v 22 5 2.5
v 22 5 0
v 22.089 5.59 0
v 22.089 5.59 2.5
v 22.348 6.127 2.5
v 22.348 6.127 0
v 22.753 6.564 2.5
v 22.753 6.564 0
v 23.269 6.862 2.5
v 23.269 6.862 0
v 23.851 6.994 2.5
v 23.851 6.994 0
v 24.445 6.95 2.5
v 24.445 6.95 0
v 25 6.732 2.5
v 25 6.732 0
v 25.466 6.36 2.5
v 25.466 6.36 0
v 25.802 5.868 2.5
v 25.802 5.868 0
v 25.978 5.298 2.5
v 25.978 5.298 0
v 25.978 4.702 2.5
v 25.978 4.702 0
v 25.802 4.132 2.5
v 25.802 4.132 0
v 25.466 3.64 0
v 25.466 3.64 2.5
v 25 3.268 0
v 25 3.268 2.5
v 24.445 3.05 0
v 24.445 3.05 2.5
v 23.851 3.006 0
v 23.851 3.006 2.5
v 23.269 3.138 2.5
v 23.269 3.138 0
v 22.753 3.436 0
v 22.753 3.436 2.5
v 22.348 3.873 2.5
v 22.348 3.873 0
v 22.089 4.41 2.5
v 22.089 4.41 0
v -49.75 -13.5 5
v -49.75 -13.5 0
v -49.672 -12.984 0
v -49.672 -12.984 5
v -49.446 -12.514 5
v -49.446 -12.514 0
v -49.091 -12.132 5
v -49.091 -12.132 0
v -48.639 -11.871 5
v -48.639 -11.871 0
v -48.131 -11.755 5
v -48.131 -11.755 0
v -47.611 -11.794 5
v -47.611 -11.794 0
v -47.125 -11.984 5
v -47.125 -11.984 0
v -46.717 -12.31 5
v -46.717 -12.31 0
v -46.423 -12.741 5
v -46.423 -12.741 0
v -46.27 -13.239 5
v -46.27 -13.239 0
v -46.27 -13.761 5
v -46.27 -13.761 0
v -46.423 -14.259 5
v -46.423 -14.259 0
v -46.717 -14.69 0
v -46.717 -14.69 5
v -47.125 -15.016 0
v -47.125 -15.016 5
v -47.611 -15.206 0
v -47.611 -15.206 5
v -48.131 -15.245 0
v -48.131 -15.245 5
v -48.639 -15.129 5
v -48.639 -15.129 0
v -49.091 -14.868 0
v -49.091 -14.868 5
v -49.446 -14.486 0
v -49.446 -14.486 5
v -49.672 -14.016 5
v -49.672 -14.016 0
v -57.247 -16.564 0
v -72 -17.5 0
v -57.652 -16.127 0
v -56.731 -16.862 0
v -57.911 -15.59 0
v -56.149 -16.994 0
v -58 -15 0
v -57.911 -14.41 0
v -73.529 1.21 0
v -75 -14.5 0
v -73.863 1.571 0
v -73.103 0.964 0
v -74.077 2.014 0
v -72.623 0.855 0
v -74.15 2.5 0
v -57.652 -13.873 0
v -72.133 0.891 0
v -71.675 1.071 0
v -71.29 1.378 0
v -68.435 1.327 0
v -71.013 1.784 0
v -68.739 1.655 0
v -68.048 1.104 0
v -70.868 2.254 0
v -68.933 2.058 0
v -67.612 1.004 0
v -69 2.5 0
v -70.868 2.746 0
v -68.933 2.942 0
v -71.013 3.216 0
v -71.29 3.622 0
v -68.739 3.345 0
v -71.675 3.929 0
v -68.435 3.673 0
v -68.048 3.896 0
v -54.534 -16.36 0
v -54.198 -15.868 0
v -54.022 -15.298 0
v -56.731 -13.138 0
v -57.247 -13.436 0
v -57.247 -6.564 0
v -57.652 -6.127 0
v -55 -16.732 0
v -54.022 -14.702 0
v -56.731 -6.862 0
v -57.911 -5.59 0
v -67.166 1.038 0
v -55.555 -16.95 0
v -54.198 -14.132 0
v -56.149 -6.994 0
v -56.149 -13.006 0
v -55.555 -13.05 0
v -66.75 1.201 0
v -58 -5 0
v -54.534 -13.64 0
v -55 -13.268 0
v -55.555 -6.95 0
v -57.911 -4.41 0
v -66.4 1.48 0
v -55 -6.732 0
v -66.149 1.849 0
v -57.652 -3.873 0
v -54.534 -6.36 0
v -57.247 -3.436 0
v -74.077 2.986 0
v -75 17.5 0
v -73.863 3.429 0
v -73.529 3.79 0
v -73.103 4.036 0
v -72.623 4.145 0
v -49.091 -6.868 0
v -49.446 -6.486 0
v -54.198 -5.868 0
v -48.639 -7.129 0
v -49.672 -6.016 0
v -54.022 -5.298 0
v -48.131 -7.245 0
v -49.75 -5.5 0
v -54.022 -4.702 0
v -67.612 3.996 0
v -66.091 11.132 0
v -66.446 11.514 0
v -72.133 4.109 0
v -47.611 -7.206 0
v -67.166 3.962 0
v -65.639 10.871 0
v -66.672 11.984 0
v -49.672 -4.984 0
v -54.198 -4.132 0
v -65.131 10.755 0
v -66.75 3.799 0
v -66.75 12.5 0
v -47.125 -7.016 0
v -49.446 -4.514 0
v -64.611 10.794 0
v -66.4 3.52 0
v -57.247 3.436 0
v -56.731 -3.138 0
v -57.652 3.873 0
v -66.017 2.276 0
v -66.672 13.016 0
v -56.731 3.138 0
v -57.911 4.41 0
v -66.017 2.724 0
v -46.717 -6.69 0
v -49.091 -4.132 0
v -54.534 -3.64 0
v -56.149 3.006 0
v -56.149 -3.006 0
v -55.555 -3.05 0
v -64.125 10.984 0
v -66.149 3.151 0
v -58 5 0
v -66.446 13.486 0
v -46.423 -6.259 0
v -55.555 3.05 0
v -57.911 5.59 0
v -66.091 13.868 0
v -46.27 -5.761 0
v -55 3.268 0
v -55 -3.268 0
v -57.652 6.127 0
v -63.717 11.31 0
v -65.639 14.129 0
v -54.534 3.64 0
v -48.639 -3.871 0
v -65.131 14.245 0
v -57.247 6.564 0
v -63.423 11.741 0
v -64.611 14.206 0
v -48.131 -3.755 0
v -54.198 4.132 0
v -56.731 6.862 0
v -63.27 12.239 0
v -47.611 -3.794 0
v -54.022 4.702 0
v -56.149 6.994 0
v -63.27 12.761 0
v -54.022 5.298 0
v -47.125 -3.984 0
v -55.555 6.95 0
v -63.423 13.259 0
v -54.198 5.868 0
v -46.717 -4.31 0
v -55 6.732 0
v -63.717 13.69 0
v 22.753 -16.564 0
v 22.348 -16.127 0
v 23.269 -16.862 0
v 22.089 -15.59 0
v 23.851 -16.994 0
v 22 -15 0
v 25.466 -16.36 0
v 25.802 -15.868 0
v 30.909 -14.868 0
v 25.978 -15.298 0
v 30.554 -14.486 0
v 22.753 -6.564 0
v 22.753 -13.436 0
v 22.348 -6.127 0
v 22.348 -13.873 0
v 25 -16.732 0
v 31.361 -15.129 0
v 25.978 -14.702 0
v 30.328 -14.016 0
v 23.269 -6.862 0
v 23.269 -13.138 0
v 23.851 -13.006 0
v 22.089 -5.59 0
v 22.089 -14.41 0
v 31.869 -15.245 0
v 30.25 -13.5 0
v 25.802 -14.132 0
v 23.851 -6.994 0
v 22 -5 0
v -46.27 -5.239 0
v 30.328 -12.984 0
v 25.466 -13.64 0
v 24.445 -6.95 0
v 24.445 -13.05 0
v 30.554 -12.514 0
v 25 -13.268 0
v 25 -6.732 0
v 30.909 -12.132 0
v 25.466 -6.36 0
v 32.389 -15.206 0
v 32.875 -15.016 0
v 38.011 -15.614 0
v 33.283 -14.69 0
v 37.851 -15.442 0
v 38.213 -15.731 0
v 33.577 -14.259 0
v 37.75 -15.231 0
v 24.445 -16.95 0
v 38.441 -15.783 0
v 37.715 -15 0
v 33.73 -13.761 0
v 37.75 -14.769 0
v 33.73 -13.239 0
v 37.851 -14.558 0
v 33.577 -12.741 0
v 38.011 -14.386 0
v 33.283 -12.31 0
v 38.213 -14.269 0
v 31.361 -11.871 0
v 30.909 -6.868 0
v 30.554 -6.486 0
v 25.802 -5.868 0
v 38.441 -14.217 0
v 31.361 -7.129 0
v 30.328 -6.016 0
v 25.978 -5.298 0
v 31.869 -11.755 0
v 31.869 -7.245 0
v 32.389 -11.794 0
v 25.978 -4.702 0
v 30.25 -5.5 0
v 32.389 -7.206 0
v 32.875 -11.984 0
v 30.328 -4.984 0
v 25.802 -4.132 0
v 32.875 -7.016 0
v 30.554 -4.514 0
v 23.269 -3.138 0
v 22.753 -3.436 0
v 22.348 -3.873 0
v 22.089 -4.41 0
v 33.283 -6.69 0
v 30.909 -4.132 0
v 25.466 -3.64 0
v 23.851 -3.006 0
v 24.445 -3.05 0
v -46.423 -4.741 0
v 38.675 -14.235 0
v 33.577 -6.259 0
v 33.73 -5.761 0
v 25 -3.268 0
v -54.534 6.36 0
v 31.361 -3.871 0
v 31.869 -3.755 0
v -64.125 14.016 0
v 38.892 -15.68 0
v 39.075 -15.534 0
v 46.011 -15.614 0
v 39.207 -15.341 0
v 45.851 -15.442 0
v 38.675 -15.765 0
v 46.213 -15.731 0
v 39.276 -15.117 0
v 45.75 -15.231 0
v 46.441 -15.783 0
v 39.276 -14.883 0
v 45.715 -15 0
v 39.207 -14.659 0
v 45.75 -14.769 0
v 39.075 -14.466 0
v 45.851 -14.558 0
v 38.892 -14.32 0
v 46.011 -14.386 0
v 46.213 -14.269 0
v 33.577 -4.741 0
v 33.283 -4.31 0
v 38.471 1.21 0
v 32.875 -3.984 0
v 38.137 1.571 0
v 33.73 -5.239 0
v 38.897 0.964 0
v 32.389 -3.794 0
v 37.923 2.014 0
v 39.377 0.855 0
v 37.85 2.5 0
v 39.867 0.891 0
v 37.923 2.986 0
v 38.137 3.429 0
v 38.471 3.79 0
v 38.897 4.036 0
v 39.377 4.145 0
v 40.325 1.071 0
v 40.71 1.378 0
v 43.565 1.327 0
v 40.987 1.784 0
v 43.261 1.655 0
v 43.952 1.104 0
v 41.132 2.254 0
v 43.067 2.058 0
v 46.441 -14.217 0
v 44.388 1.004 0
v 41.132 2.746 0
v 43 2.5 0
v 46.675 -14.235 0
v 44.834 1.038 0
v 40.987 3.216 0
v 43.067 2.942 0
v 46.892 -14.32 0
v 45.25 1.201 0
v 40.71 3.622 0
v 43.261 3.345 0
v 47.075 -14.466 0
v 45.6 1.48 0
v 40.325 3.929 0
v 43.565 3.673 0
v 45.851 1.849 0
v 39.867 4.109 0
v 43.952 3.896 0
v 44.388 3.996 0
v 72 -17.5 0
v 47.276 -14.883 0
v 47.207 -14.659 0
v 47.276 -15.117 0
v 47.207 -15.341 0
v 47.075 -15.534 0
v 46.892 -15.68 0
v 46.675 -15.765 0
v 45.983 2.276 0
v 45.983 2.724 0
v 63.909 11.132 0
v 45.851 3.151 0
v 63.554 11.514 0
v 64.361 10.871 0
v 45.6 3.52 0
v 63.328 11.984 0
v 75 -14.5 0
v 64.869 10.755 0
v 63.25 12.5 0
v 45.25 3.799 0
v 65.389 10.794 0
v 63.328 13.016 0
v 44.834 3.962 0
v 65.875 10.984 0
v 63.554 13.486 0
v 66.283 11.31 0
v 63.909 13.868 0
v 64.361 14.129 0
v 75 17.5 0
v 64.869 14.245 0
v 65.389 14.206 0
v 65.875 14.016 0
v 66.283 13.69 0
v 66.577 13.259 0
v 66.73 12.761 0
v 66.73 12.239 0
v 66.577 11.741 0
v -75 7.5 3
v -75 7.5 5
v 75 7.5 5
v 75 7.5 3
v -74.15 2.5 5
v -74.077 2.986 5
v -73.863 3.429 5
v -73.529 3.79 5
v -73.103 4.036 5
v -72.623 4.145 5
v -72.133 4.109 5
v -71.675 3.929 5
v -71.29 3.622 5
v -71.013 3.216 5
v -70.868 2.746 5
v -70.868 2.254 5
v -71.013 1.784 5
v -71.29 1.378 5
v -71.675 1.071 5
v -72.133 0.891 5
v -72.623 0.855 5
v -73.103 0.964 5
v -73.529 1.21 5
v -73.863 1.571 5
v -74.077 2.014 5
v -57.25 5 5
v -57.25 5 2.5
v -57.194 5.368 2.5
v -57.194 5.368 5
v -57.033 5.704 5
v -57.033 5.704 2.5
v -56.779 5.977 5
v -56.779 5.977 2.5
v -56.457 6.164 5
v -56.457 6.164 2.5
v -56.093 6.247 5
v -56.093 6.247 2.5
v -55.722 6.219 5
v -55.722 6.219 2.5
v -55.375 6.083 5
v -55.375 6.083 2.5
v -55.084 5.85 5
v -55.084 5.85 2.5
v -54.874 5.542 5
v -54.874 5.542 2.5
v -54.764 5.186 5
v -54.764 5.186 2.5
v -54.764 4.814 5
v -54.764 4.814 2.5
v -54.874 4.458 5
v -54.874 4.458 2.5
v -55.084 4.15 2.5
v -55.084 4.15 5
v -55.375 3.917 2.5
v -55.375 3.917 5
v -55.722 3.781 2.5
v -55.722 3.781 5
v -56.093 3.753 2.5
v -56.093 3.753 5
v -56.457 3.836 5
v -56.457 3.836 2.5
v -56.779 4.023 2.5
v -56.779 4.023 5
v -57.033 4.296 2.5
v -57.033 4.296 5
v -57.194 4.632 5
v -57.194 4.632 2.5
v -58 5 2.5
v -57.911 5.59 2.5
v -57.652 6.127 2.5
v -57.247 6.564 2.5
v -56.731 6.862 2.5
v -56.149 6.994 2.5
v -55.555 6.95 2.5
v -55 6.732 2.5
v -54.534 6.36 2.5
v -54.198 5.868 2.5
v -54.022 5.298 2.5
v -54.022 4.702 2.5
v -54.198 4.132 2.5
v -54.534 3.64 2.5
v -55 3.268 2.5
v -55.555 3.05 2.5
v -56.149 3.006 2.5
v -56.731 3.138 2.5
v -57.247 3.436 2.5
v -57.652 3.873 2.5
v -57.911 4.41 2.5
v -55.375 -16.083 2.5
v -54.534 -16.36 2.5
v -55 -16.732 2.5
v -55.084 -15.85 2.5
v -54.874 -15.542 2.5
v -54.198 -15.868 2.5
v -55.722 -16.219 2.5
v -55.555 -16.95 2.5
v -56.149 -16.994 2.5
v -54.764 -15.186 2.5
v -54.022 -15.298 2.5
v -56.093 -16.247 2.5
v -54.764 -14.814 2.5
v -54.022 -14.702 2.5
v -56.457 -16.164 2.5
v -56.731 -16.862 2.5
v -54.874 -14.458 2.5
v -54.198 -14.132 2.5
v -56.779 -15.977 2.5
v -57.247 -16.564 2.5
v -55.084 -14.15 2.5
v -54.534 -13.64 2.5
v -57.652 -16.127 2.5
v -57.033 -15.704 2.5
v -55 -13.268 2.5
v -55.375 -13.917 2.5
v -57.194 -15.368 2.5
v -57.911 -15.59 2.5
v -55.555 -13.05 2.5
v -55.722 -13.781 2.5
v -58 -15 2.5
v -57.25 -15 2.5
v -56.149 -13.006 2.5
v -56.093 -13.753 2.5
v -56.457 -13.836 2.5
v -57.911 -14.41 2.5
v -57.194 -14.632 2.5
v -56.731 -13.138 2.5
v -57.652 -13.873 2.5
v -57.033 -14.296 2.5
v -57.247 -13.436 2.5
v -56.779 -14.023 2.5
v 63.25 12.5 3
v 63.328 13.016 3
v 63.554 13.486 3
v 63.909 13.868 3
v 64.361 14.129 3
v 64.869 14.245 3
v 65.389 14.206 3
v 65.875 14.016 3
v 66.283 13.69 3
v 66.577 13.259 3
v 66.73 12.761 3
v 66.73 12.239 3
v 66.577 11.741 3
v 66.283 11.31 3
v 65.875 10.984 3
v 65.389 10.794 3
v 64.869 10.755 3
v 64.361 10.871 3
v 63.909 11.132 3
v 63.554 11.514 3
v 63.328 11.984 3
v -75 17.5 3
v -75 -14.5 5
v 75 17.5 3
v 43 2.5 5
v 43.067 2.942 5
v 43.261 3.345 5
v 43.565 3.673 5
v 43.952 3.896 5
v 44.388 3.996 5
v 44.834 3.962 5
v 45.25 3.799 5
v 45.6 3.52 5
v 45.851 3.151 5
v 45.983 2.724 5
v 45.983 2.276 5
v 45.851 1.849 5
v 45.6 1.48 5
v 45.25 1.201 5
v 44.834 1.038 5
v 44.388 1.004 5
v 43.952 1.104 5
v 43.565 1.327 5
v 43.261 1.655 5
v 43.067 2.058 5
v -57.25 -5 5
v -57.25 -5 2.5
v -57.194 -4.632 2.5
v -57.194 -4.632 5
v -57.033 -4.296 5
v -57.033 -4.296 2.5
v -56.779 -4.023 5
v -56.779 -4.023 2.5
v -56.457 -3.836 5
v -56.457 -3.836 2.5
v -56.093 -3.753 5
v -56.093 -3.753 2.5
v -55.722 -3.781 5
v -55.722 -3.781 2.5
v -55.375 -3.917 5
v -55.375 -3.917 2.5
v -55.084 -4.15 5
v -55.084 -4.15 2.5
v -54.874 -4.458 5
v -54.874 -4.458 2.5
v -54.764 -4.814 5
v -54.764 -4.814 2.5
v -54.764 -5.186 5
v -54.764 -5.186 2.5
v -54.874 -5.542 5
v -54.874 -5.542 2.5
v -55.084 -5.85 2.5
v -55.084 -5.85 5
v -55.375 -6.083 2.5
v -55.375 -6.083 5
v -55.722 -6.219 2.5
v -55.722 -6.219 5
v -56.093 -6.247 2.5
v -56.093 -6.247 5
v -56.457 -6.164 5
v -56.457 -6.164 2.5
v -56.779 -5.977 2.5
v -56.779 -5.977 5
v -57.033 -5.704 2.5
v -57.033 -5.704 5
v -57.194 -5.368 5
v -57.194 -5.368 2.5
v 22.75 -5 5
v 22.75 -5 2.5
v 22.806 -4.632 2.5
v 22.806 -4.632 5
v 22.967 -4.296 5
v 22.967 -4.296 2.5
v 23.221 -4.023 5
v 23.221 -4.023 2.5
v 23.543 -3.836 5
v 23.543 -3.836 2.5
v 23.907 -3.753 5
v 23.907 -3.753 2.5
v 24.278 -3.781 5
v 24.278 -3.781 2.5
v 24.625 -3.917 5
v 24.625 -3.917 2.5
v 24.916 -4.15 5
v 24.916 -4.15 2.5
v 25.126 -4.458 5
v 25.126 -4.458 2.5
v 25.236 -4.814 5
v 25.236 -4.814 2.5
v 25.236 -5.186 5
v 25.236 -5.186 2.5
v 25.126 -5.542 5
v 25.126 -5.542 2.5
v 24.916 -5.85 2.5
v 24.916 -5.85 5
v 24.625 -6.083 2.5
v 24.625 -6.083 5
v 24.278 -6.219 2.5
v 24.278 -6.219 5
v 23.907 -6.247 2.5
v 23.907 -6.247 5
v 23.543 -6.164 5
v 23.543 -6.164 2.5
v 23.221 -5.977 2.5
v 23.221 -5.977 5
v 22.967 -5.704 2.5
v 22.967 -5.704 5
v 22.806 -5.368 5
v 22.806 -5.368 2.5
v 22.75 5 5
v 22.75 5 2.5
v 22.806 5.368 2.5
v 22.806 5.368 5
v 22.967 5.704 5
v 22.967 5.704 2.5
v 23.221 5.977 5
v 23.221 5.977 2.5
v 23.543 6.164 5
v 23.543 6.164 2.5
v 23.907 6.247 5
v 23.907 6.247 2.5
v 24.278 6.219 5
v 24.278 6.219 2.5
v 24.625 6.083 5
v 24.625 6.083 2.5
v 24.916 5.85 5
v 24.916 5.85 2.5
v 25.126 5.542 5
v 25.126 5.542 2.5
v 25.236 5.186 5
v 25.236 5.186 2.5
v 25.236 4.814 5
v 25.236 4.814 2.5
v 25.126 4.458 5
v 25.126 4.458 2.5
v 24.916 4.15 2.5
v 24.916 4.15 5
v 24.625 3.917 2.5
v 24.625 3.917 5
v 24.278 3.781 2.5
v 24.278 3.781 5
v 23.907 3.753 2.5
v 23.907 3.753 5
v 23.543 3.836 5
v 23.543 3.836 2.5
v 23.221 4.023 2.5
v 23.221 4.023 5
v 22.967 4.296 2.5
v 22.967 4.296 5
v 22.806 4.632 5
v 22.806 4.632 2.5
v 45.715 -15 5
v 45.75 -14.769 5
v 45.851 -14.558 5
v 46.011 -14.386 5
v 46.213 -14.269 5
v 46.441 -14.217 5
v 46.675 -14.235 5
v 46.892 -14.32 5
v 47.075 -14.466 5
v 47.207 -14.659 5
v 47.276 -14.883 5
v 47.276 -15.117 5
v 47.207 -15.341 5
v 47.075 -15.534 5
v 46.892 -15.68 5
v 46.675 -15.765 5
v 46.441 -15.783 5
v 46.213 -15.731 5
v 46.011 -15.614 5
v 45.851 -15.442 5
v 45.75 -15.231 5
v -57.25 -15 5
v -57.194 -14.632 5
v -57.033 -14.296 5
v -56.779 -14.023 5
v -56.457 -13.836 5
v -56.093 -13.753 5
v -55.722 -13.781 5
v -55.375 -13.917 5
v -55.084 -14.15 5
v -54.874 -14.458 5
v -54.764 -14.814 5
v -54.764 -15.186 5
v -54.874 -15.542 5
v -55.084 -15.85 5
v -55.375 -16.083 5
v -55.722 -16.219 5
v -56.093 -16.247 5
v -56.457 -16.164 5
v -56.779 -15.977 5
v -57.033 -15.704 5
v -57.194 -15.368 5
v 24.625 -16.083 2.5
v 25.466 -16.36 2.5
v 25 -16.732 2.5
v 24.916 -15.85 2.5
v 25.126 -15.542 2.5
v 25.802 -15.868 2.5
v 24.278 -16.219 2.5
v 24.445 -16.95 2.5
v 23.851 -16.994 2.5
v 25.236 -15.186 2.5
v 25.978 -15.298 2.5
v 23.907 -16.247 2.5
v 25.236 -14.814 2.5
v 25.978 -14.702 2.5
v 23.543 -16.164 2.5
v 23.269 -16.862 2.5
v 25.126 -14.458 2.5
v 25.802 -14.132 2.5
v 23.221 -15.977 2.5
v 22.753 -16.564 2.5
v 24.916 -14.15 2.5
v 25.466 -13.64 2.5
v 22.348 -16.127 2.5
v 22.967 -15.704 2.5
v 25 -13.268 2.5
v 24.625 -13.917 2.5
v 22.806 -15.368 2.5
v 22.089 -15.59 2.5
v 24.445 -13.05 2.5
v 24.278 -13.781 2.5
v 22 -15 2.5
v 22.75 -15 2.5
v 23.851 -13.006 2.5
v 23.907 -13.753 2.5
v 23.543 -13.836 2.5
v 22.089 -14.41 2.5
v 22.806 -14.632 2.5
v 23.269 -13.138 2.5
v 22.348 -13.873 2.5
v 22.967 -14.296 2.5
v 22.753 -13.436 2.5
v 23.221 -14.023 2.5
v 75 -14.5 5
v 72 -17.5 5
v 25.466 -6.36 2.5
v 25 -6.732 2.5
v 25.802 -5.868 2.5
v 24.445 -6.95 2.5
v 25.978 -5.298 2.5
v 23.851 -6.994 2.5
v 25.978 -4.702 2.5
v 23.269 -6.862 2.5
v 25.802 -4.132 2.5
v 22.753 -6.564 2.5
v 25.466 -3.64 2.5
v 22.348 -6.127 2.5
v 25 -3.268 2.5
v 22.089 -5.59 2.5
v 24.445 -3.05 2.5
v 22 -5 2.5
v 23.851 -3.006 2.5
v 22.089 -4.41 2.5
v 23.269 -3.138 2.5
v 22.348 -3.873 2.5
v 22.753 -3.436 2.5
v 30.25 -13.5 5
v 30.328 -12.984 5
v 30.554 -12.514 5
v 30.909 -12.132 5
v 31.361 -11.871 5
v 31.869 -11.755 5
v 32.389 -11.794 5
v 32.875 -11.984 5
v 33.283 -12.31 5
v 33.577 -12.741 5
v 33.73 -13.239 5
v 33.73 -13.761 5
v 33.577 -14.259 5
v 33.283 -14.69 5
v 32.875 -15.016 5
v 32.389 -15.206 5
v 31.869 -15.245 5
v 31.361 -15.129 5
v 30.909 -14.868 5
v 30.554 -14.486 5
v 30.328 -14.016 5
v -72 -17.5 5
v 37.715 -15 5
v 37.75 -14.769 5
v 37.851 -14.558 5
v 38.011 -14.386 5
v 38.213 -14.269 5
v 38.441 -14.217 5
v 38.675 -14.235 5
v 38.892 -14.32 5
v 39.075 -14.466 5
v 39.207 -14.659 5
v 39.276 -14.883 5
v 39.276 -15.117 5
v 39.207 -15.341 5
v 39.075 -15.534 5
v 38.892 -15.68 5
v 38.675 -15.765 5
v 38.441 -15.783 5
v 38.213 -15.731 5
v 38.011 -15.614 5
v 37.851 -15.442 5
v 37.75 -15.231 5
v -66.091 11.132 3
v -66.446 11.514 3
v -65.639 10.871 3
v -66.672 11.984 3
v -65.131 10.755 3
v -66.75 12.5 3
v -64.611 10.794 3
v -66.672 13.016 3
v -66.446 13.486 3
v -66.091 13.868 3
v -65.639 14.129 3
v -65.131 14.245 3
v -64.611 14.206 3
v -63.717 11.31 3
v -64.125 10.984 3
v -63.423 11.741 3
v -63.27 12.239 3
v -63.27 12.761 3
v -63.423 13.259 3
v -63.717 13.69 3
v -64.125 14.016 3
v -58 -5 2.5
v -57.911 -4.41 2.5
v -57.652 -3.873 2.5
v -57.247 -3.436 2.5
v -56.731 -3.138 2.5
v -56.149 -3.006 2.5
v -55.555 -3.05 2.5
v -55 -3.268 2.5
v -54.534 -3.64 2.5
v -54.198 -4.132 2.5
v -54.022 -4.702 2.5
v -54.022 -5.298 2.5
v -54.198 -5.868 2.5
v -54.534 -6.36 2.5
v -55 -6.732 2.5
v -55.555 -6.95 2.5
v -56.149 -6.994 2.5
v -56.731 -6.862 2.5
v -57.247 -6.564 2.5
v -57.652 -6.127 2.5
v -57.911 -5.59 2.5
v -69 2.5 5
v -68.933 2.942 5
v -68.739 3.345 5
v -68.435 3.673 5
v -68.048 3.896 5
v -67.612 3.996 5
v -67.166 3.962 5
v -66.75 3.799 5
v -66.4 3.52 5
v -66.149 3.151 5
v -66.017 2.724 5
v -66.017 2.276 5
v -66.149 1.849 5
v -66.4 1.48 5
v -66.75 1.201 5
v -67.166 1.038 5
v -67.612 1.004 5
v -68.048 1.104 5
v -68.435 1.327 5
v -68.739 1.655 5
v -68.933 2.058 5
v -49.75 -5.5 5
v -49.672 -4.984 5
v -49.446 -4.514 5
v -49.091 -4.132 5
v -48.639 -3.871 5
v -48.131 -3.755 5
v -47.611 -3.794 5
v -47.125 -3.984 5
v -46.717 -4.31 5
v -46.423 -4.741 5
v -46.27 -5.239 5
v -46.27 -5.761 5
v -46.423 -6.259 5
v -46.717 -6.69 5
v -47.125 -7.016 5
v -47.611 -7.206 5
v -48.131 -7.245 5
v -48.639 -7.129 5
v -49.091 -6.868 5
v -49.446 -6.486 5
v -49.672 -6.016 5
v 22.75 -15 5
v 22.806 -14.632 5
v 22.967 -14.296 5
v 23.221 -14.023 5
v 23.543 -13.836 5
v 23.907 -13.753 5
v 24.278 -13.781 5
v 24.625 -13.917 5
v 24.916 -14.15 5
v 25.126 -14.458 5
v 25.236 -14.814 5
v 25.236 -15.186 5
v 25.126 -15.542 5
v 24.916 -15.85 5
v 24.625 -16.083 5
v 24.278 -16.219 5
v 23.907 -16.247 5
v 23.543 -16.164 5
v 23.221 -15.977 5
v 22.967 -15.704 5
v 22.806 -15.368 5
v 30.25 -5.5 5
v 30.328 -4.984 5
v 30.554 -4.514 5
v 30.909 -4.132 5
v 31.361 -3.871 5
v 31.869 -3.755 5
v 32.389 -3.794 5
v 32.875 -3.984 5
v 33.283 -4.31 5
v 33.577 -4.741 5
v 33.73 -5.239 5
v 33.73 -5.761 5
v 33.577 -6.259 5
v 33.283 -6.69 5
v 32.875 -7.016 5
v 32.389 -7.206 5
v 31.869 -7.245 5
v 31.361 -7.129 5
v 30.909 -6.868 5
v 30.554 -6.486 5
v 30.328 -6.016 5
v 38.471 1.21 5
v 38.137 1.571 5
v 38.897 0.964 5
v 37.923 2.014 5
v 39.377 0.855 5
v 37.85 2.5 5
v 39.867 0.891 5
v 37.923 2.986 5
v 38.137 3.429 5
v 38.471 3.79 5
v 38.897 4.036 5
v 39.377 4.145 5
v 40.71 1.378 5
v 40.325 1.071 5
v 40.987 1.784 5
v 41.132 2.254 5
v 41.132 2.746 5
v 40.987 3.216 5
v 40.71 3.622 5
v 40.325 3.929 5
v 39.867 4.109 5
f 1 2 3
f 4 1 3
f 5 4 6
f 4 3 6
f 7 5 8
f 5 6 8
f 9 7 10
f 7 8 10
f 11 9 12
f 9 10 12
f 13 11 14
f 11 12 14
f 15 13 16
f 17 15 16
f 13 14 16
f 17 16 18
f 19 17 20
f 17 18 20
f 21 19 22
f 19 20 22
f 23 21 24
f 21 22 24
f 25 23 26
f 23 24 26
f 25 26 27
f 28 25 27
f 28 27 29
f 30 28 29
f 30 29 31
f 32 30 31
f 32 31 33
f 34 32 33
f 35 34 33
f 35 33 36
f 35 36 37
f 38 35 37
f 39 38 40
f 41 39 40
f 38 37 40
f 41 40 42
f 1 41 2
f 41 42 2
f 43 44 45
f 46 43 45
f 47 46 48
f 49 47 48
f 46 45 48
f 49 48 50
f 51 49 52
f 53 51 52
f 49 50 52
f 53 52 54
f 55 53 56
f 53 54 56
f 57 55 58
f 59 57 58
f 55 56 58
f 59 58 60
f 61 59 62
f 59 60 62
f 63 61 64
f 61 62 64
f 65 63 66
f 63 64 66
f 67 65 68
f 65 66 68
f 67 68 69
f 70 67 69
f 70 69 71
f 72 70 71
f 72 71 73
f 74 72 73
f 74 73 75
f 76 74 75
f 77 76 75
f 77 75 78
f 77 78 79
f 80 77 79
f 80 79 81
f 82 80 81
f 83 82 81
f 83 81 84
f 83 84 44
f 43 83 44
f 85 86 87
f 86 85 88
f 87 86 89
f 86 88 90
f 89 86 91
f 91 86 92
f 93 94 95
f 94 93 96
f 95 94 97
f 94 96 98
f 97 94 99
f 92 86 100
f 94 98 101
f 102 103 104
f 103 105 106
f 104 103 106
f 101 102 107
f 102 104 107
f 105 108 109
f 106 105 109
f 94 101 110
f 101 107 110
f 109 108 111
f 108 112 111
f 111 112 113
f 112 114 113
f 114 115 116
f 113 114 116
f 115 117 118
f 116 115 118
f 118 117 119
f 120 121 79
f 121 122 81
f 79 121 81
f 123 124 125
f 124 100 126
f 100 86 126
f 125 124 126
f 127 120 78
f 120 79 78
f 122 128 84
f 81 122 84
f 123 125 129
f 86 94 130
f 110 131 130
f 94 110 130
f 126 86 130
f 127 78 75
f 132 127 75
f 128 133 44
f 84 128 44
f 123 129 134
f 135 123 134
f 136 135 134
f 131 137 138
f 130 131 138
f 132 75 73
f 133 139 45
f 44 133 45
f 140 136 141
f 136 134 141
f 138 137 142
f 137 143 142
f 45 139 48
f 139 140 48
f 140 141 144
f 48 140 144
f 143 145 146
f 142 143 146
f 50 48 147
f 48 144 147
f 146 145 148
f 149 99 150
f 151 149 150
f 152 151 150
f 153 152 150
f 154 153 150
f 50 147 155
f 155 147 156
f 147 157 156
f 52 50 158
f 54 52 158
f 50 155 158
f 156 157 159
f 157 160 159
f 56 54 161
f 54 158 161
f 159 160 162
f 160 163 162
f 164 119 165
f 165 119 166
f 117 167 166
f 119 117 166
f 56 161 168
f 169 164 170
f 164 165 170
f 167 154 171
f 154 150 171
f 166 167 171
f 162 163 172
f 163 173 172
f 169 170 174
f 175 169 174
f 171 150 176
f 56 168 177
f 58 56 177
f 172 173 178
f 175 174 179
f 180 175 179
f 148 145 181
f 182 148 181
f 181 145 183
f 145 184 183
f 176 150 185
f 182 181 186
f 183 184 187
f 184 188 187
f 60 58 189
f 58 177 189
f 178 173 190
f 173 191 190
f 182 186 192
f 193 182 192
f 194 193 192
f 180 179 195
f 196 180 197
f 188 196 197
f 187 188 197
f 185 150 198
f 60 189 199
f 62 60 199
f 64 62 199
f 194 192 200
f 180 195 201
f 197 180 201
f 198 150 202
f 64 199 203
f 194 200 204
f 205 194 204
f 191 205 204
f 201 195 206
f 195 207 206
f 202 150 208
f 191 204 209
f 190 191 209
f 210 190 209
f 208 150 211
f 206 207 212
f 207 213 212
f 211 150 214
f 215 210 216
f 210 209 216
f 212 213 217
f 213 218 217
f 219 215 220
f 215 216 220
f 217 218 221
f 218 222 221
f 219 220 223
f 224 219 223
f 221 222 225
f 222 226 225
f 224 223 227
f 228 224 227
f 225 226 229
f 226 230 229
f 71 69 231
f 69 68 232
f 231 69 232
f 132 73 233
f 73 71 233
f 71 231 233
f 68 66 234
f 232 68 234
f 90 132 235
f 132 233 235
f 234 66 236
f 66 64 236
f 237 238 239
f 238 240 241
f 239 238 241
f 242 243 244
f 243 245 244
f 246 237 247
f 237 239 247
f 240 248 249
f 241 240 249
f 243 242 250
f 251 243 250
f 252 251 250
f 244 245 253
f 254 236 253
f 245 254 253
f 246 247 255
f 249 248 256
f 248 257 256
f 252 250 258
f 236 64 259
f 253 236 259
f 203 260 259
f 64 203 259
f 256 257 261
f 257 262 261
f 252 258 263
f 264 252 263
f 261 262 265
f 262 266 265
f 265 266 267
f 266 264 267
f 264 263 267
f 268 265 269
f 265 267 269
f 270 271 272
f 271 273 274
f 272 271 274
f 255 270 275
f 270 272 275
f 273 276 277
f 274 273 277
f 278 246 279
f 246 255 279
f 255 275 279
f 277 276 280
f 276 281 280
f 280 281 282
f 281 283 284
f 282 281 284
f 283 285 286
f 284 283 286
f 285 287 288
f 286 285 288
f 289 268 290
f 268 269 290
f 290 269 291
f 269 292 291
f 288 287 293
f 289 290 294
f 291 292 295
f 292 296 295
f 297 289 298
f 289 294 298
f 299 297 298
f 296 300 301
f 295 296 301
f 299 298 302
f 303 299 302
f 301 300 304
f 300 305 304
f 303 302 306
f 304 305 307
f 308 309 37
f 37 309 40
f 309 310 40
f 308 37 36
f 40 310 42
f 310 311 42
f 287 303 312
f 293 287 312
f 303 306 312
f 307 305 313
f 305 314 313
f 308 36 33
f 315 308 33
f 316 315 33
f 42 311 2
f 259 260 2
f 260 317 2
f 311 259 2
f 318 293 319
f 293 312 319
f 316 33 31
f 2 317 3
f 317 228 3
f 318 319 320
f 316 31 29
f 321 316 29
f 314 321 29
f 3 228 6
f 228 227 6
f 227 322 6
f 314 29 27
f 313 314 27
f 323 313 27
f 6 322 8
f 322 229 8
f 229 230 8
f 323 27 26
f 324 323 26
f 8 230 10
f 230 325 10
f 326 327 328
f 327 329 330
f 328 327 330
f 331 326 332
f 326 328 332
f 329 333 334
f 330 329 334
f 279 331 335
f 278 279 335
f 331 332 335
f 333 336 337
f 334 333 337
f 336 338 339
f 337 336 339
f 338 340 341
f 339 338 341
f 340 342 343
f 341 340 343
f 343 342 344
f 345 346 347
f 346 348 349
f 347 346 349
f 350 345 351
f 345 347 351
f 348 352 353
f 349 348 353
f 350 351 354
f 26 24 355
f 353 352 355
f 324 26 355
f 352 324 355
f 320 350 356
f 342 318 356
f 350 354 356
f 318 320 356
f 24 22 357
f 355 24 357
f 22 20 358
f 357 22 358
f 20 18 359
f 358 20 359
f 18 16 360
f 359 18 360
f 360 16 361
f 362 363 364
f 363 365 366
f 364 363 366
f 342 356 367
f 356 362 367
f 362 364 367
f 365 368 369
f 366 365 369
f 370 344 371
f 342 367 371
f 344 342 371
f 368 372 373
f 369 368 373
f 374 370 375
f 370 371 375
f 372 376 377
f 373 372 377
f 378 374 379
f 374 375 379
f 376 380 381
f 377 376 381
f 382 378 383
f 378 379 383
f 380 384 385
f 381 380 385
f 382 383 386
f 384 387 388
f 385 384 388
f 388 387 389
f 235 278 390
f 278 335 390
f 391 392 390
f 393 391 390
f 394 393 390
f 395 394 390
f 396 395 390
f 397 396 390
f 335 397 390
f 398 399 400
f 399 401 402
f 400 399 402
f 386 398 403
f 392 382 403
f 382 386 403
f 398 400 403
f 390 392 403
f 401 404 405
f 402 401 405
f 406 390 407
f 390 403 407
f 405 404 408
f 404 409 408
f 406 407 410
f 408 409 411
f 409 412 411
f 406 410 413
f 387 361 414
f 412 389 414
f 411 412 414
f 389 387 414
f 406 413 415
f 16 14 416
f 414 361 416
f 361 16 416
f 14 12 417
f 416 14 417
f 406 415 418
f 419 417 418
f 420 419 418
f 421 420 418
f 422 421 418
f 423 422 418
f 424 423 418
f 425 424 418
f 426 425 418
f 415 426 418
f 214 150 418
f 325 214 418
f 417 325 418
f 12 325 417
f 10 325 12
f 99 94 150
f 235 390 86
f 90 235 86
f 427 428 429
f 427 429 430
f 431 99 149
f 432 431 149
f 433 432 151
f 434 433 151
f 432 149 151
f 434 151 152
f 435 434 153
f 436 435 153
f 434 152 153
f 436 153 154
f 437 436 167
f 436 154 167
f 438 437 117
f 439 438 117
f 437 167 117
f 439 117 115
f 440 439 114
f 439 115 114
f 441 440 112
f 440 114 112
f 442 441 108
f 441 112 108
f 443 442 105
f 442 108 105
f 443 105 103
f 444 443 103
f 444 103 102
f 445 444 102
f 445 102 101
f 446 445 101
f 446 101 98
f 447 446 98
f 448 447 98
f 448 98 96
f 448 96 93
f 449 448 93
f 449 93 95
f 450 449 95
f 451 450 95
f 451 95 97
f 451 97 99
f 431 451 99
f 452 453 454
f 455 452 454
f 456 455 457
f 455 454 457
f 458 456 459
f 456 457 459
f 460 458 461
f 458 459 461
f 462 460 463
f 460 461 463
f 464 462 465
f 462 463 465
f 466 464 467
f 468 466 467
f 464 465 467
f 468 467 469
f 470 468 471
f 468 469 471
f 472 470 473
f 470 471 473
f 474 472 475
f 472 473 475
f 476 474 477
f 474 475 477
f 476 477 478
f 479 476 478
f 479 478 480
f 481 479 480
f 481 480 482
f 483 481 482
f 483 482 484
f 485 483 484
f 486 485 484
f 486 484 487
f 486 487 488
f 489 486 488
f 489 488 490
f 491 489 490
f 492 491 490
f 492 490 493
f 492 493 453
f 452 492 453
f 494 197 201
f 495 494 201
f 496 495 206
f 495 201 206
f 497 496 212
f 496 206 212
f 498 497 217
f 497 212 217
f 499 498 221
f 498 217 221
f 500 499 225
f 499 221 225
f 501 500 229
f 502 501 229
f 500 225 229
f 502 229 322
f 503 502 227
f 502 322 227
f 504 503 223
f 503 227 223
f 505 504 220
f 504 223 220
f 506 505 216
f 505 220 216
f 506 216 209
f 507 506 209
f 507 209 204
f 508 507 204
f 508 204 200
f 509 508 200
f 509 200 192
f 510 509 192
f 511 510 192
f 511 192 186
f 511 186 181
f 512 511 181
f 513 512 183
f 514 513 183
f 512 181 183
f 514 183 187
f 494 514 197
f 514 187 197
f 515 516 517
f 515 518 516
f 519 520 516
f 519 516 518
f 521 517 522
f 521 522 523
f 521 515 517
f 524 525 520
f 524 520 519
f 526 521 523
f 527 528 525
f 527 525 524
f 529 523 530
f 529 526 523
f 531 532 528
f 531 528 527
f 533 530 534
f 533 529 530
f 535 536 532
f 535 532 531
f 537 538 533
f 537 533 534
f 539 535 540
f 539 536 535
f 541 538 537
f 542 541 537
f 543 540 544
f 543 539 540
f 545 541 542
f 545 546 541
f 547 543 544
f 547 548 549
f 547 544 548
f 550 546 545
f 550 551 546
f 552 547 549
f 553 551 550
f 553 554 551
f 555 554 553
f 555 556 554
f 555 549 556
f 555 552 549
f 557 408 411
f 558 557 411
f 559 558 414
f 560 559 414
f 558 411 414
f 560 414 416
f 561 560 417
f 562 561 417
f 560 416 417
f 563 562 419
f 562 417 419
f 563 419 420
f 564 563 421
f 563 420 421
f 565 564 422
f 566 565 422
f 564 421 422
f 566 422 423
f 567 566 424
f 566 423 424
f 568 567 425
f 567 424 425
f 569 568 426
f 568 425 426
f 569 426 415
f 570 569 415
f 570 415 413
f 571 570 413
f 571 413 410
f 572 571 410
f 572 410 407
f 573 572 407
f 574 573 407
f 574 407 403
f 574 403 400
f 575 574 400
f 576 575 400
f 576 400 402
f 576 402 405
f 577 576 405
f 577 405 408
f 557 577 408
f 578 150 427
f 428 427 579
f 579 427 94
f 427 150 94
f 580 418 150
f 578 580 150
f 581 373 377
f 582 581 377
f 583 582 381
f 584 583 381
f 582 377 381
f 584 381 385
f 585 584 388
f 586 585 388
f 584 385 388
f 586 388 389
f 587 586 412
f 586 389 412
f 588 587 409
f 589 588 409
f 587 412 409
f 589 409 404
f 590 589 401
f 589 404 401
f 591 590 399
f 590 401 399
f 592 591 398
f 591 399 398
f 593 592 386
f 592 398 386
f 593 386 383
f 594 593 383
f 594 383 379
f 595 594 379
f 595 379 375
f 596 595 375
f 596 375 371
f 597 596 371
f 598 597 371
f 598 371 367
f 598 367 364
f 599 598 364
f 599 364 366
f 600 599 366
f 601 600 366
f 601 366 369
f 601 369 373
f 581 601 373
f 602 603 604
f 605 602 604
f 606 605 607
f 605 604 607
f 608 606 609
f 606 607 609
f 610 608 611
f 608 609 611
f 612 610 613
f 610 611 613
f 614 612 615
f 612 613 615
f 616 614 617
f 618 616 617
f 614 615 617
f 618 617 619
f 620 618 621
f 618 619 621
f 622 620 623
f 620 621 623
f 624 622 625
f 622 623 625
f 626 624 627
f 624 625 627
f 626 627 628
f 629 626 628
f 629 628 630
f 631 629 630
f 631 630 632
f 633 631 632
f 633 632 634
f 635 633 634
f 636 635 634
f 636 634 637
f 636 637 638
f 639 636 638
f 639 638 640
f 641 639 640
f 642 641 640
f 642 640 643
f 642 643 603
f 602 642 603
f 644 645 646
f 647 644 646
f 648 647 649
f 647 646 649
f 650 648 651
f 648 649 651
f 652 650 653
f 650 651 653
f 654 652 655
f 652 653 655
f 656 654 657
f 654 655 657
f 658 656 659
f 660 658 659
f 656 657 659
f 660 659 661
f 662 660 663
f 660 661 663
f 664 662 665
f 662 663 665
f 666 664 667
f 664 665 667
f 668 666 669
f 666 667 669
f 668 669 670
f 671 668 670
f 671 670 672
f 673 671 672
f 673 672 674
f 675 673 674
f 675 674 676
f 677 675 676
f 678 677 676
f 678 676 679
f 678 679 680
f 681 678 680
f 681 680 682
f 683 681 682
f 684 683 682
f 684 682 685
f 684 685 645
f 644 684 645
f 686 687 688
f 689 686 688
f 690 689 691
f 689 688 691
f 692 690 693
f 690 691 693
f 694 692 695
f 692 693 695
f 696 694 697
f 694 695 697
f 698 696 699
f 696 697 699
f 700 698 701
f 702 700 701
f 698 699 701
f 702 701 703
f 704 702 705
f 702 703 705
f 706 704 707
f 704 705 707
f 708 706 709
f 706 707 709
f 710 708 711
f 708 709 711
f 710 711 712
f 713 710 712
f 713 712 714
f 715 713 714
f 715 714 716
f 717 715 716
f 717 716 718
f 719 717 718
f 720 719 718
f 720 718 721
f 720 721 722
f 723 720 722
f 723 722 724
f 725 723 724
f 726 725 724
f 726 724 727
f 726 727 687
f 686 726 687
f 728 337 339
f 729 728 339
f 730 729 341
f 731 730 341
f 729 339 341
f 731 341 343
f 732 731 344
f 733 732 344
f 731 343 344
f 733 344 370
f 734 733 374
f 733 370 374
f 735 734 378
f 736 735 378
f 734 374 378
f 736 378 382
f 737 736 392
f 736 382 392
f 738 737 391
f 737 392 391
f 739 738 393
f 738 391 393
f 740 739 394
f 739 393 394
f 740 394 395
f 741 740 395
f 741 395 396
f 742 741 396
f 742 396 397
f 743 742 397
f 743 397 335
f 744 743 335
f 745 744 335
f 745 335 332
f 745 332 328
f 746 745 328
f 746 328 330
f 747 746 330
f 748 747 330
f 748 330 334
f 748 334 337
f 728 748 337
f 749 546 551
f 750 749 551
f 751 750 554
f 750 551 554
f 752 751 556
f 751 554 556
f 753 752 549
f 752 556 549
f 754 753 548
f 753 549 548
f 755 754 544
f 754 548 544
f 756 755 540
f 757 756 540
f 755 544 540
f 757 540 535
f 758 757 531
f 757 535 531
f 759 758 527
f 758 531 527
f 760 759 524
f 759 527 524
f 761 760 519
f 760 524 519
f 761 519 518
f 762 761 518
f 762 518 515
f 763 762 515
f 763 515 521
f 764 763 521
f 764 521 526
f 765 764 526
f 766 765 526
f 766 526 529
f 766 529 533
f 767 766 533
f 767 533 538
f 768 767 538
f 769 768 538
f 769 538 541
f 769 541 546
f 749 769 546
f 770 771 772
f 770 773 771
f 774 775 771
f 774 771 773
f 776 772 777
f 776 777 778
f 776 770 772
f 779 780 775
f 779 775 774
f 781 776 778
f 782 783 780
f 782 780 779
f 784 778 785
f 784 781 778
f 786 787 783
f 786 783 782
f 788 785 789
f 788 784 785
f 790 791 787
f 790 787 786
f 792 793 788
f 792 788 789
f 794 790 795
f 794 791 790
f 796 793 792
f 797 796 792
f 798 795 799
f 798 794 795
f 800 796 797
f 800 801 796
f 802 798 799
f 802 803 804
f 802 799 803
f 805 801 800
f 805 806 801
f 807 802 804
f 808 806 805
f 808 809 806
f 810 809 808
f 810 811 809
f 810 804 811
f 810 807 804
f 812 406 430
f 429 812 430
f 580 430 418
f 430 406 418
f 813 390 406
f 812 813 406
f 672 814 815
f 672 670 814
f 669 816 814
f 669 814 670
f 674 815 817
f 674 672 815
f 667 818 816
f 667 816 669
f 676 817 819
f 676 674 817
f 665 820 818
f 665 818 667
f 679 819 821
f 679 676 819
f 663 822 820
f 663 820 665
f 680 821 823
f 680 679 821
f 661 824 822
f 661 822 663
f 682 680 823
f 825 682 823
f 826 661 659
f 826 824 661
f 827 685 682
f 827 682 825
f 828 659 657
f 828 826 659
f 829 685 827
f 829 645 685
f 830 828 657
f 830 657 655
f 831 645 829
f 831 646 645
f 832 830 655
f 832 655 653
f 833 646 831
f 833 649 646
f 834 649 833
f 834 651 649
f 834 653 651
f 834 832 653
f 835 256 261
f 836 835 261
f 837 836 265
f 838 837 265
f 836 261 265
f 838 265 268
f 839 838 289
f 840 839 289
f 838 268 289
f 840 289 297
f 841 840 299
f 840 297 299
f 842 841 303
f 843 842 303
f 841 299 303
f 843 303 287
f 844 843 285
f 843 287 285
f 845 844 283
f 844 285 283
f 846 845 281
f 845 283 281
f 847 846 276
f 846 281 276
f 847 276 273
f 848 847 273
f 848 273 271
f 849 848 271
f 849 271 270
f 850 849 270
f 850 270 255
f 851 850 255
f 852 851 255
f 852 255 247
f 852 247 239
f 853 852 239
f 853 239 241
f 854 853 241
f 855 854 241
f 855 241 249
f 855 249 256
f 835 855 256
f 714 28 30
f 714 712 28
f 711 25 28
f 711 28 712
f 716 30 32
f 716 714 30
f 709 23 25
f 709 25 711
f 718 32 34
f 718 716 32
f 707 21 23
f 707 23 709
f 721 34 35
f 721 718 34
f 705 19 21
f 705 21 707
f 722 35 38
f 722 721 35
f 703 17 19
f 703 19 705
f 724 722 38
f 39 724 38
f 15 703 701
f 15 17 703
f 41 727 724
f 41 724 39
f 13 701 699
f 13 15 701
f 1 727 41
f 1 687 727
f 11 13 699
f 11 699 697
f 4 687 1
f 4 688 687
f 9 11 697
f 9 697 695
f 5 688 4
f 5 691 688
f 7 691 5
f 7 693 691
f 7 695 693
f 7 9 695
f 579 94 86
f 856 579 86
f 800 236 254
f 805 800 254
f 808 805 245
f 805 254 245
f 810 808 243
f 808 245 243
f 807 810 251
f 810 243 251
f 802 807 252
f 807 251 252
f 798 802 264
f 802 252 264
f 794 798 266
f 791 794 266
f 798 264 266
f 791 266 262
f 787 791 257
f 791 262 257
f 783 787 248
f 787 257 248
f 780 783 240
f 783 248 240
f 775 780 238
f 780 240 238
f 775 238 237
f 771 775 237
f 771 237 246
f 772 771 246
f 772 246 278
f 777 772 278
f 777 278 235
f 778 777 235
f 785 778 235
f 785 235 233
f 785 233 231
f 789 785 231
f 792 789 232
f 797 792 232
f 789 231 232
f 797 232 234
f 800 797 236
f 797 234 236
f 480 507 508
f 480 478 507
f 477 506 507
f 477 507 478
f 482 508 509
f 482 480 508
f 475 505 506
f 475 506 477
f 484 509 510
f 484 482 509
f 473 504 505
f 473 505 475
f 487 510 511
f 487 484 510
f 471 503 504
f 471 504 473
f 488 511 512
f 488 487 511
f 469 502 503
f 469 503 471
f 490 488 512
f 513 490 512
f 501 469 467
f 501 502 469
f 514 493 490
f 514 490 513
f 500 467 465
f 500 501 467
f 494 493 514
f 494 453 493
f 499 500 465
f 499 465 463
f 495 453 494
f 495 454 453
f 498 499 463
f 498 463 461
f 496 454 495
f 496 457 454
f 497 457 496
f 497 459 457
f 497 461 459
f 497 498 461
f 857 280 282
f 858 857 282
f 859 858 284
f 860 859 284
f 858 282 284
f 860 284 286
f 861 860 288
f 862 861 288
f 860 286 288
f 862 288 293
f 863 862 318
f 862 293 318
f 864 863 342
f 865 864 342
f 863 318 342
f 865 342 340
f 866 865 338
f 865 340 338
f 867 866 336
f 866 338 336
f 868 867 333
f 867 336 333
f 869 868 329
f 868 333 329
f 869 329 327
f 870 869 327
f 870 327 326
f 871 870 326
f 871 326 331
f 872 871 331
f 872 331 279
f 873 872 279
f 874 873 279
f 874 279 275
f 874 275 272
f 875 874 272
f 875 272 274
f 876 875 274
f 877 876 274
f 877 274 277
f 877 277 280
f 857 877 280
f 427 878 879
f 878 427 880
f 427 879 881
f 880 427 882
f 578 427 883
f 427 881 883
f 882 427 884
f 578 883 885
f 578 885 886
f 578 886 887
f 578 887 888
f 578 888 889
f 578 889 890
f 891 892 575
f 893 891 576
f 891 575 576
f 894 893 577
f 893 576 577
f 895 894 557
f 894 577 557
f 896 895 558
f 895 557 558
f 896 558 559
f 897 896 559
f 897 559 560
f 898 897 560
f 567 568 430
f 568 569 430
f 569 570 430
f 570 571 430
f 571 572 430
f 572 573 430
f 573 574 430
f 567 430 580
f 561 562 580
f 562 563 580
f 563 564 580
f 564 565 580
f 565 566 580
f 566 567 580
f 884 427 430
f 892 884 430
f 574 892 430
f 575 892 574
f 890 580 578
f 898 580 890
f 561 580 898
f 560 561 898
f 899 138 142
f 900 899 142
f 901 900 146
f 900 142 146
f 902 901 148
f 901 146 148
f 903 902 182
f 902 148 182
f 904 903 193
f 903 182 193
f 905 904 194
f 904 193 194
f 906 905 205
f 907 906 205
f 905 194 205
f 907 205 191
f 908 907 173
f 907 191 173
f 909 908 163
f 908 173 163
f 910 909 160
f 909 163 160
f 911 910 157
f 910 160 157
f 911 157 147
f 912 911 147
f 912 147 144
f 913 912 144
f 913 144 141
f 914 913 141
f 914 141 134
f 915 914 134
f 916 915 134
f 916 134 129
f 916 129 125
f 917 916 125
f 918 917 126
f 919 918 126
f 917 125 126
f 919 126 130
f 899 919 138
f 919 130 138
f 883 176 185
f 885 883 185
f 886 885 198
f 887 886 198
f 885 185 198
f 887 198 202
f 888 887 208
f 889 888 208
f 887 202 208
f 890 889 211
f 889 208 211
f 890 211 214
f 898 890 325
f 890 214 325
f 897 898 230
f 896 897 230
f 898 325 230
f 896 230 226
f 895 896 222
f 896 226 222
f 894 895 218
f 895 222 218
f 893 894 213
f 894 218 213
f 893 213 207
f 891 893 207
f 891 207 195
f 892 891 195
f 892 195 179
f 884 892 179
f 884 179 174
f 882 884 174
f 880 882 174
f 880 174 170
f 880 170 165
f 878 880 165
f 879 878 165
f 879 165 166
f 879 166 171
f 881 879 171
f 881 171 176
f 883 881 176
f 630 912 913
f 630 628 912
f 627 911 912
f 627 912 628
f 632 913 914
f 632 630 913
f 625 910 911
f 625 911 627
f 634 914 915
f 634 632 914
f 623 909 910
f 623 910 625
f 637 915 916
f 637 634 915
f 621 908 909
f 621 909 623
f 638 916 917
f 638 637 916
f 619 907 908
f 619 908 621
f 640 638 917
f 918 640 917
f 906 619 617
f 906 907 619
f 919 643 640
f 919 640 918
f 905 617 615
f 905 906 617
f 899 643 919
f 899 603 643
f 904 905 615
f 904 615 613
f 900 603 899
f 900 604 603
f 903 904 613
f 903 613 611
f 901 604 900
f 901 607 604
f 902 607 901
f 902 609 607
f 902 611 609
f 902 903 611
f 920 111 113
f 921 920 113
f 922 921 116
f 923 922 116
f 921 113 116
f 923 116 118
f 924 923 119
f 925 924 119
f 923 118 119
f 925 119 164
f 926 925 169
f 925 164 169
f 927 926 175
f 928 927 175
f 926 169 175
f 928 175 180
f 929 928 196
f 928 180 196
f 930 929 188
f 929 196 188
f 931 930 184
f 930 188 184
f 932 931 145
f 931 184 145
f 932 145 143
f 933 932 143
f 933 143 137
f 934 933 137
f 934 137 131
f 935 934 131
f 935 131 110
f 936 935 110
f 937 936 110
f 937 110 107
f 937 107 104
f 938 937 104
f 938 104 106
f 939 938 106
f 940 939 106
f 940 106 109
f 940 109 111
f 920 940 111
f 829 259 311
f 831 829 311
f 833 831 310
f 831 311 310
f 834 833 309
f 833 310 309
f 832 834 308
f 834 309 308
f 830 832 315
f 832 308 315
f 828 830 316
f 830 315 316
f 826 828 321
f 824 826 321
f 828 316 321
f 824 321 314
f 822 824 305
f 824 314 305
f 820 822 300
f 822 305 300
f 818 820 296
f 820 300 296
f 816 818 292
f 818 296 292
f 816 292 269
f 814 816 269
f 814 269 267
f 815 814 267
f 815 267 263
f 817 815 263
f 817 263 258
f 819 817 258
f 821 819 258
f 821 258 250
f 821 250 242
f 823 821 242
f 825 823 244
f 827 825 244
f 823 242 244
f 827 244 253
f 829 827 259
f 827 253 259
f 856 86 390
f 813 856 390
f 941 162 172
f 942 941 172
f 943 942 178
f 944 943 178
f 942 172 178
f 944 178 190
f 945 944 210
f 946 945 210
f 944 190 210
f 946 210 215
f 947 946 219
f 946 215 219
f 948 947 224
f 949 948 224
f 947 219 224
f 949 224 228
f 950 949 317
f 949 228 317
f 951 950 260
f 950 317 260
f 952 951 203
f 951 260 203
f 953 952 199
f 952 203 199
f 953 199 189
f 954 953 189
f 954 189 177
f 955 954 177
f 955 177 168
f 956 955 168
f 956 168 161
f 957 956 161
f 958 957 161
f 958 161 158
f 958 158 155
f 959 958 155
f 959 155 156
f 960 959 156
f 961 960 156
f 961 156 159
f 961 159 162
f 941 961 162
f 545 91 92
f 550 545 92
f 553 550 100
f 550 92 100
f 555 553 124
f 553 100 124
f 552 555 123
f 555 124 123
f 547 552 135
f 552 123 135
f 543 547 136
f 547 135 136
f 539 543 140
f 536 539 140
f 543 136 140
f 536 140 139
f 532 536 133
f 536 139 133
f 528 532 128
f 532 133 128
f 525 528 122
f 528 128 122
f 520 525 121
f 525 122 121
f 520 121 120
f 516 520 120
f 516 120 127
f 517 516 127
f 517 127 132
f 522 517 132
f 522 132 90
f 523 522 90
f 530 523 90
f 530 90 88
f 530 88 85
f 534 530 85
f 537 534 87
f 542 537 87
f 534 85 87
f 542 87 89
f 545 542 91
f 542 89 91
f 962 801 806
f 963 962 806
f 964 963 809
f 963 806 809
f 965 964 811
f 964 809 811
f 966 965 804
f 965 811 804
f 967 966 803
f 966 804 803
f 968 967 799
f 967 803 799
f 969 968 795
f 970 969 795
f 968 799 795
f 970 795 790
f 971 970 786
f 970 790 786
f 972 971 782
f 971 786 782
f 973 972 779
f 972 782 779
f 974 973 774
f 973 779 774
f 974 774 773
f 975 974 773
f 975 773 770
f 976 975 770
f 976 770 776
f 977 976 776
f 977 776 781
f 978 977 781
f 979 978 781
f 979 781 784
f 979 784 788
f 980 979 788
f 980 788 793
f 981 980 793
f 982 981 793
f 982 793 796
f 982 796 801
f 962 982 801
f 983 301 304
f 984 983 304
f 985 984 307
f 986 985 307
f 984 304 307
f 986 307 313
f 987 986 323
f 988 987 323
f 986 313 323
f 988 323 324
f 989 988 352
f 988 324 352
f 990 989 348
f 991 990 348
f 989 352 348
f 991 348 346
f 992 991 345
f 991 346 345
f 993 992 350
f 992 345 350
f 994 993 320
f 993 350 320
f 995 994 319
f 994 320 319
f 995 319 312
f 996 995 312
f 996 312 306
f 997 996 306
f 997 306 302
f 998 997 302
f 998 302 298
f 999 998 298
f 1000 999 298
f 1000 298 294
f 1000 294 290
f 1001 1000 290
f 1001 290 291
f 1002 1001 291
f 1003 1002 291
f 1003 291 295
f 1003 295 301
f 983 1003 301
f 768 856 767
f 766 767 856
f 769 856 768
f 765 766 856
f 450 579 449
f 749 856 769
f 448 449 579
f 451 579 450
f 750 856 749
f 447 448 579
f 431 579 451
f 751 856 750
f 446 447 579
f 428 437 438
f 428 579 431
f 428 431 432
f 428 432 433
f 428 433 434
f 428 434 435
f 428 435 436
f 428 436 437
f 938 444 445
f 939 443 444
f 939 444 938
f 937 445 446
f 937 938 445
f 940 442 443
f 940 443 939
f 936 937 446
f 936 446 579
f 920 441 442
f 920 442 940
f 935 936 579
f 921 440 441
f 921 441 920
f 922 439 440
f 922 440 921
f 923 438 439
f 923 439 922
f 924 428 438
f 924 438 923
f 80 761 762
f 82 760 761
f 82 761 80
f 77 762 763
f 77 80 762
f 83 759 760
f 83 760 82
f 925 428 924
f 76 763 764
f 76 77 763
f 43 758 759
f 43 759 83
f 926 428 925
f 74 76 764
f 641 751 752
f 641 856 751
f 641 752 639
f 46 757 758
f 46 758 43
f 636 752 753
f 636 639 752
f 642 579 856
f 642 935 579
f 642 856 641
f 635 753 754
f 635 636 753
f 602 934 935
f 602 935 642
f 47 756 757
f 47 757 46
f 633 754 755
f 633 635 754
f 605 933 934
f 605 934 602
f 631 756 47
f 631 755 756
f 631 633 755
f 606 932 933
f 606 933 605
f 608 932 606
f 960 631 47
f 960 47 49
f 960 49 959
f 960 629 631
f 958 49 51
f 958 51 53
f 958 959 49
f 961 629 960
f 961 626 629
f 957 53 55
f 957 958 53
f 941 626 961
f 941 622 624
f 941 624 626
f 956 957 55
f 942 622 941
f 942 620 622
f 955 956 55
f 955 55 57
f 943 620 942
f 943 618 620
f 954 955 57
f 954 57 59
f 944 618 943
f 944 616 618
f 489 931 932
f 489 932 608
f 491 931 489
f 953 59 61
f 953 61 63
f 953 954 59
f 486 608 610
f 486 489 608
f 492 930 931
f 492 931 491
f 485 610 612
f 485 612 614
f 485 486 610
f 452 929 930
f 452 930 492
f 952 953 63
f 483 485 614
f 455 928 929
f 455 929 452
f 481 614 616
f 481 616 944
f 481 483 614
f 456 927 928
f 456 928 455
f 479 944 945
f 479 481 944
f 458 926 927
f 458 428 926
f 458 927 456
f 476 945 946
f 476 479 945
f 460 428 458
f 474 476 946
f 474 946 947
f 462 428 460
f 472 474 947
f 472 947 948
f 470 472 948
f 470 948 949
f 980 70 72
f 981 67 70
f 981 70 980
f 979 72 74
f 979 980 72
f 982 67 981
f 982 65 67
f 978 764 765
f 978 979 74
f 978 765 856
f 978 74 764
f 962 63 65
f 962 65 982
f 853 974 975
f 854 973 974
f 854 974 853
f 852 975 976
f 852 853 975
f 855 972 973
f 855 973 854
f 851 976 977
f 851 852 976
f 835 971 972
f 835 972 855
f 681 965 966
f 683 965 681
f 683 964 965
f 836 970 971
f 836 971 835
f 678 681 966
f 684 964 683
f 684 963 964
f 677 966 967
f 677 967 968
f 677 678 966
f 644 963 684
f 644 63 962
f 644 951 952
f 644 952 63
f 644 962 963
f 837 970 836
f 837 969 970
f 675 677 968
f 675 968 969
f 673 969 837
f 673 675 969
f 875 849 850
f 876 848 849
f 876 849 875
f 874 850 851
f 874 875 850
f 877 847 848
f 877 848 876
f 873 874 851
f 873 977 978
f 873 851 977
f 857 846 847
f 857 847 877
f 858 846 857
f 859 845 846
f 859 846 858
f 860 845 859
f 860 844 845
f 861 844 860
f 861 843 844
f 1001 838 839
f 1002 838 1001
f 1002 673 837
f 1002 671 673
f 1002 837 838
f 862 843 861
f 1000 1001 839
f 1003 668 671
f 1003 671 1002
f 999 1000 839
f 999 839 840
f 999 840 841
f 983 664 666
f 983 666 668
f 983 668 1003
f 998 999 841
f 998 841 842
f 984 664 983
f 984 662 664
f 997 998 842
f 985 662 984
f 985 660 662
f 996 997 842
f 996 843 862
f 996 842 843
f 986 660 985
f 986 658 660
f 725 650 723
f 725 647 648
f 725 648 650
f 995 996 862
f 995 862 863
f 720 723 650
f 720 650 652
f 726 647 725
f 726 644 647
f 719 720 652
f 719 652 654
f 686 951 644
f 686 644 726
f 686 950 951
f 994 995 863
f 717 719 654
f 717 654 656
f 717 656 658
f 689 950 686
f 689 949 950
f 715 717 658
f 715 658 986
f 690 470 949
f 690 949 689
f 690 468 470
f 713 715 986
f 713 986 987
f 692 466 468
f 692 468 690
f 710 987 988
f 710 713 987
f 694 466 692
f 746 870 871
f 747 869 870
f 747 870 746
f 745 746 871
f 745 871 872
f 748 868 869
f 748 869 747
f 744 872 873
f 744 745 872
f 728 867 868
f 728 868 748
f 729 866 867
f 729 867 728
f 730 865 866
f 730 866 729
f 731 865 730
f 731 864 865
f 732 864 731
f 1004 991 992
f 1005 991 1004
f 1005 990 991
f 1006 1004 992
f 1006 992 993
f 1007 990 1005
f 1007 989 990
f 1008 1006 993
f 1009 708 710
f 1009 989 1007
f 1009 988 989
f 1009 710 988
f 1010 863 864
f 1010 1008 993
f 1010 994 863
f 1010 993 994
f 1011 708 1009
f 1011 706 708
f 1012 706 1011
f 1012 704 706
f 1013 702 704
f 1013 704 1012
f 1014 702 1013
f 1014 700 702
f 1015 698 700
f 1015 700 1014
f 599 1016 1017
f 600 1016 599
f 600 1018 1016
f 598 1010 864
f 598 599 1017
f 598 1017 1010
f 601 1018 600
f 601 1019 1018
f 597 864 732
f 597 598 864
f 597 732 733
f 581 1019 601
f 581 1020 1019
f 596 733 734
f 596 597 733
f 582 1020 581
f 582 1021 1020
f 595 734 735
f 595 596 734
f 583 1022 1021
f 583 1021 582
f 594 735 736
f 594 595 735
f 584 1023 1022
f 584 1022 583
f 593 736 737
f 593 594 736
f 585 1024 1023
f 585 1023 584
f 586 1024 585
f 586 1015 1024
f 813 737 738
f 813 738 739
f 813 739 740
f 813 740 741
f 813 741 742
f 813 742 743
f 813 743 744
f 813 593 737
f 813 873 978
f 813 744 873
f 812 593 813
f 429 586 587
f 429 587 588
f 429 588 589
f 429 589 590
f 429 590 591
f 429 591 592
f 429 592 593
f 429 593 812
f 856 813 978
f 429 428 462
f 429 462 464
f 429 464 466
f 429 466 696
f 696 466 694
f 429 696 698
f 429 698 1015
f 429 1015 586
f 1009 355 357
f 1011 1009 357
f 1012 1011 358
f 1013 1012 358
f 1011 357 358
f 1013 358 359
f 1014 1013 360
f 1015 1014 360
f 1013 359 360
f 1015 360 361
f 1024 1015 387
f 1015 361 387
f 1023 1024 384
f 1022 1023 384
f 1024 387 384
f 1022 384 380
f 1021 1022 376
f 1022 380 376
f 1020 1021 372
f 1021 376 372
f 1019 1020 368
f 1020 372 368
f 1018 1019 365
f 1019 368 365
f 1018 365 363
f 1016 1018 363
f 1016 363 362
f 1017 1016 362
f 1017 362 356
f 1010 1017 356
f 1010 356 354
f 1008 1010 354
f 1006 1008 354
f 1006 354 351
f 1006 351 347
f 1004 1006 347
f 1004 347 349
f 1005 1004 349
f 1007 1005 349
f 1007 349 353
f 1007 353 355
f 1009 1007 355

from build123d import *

# Parameters (mm, degrees)
BOSS_EXTRUDE1_DEPTH  = 5
SKETCH2_W            = 2
SKETCH2_H            = 10
CUT_EXTRUDE1_DEPTH   = 151
SKETCH3_R            = 1.75
SKETCH3_R_2          = 1.5
SKETCH3_R_3          = 1.65
SKETCH3_R_4          = 0.785
CUT_EXTRUDE2_DEPTH   = 6
SKETCH4_R            = 2
CUT_EXTRUDE3_DEPTH   = 2.5
SKETCH5_R            = 1.25
CUT_EXTRUDE4_DEPTH   = 3.5
LPATTERN1_COUNT      = 3
LPATTERN1_PITCH      = 10
LPATTERN1_COUNT_DIR2 = 2
LPATTERN1_PITCH_DIR2 = 80


with BuildPart() as part:
    # Sketch1 → Boss-Extrude1 (new body)
    with BuildSketch(Plane.XY):
        Polygon((72, -17.5), (75, -14.5), (75, 17.5), (-75, 17.5), (-75, -14.5), (-72, -17.5), align=None)
    extrude(amount=BOSS_EXTRUDE1_DEPTH)

    # Sketch2 → Cut-Extrude1 (cut, through all)
    with BuildSketch(Plane(origin=(75, 0, 0), x_dir=(0, 0, -1), z_dir=(1, 0, 0))):
        with Locations((-4, 12.5)):
            Rectangle(SKETCH2_W, SKETCH2_H)
    extrude(amount=-CUT_EXTRUDE1_DEPTH, mode=Mode.SUBTRACT)

    # Sketch3 → Cut-Extrude2 (cut, through all)
    with BuildSketch(Plane(origin=(0, 0, 0), x_dir=(-1, 0, 0), z_dir=(0, 0, -1))):
        with Locations((-65, 12.5)):
            Circle(SKETCH3_R)
        with Locations((65, 12.5)):
            Circle(SKETCH3_R)
        with Locations((-44.5, 2.5)):
            Circle(SKETCH3_R_2)
        with Locations((-39.5, 2.5)):
            Circle(SKETCH3_R_3)
        with Locations((-46.5, -15)):
            Circle(SKETCH3_R_4)
        with Locations((-38.5, -15)):
            Circle(SKETCH3_R_4)
        with Locations((-32, -5.5)):
            Circle(SKETCH3_R)
        with Locations((-32, -13.5)):
            Circle(SKETCH3_R)
        with Locations((48, -5.5)):
            Circle(SKETCH3_R)
        with Locations((48, -13.5)):
            Circle(SKETCH3_R)
        with Locations((67.5, 2.5)):
            Circle(SKETCH3_R_2)
        with Locations((72.5, 2.5)):
            Circle(SKETCH3_R_3)
    extrude(amount=-CUT_EXTRUDE2_DEPTH, mode=Mode.SUBTRACT)

    # Sketch4 → Cut-Extrude3 (cut)
    with BuildSketch(Plane(origin=(0, 0, 0), x_dir=(-1, 0, 0), z_dir=(0, 0, -1))):
        with Locations((-24, 5)):
            Circle(SKETCH4_R)
    cut_extrude3 = extrude(amount=-CUT_EXTRUDE3_DEPTH, mode=Mode.SUBTRACT)

    # Sketch5 → Cut-Extrude4 (cut, through all)
    with BuildSketch(Plane(origin=(0, 0, 2.5), x_dir=(-1, 0, 0), z_dir=(0, 0, -1))):
        with Locations((-24, 5)):
            Circle(SKETCH5_R)
    cut_extrude4 = extrude(amount=-CUT_EXTRUDE4_DEPTH, mode=Mode.SUBTRACT)

    # LPattern1: Cut-Extrude3, Cut-Extrude4 3 × 2
    with Locations(*[(-j * LPATTERN1_PITCH_DIR2, -i * LPATTERN1_PITCH, 0) for i in range(LPATTERN1_COUNT) for j in range(LPATTERN1_COUNT_DIR2) if (i, j) != (0, 0)]):
        add(cut_extrude3, mode=Mode.SUBTRACT)
        add(cut_extrude4, mode=Mode.SUBTRACT)


solid = part.part
